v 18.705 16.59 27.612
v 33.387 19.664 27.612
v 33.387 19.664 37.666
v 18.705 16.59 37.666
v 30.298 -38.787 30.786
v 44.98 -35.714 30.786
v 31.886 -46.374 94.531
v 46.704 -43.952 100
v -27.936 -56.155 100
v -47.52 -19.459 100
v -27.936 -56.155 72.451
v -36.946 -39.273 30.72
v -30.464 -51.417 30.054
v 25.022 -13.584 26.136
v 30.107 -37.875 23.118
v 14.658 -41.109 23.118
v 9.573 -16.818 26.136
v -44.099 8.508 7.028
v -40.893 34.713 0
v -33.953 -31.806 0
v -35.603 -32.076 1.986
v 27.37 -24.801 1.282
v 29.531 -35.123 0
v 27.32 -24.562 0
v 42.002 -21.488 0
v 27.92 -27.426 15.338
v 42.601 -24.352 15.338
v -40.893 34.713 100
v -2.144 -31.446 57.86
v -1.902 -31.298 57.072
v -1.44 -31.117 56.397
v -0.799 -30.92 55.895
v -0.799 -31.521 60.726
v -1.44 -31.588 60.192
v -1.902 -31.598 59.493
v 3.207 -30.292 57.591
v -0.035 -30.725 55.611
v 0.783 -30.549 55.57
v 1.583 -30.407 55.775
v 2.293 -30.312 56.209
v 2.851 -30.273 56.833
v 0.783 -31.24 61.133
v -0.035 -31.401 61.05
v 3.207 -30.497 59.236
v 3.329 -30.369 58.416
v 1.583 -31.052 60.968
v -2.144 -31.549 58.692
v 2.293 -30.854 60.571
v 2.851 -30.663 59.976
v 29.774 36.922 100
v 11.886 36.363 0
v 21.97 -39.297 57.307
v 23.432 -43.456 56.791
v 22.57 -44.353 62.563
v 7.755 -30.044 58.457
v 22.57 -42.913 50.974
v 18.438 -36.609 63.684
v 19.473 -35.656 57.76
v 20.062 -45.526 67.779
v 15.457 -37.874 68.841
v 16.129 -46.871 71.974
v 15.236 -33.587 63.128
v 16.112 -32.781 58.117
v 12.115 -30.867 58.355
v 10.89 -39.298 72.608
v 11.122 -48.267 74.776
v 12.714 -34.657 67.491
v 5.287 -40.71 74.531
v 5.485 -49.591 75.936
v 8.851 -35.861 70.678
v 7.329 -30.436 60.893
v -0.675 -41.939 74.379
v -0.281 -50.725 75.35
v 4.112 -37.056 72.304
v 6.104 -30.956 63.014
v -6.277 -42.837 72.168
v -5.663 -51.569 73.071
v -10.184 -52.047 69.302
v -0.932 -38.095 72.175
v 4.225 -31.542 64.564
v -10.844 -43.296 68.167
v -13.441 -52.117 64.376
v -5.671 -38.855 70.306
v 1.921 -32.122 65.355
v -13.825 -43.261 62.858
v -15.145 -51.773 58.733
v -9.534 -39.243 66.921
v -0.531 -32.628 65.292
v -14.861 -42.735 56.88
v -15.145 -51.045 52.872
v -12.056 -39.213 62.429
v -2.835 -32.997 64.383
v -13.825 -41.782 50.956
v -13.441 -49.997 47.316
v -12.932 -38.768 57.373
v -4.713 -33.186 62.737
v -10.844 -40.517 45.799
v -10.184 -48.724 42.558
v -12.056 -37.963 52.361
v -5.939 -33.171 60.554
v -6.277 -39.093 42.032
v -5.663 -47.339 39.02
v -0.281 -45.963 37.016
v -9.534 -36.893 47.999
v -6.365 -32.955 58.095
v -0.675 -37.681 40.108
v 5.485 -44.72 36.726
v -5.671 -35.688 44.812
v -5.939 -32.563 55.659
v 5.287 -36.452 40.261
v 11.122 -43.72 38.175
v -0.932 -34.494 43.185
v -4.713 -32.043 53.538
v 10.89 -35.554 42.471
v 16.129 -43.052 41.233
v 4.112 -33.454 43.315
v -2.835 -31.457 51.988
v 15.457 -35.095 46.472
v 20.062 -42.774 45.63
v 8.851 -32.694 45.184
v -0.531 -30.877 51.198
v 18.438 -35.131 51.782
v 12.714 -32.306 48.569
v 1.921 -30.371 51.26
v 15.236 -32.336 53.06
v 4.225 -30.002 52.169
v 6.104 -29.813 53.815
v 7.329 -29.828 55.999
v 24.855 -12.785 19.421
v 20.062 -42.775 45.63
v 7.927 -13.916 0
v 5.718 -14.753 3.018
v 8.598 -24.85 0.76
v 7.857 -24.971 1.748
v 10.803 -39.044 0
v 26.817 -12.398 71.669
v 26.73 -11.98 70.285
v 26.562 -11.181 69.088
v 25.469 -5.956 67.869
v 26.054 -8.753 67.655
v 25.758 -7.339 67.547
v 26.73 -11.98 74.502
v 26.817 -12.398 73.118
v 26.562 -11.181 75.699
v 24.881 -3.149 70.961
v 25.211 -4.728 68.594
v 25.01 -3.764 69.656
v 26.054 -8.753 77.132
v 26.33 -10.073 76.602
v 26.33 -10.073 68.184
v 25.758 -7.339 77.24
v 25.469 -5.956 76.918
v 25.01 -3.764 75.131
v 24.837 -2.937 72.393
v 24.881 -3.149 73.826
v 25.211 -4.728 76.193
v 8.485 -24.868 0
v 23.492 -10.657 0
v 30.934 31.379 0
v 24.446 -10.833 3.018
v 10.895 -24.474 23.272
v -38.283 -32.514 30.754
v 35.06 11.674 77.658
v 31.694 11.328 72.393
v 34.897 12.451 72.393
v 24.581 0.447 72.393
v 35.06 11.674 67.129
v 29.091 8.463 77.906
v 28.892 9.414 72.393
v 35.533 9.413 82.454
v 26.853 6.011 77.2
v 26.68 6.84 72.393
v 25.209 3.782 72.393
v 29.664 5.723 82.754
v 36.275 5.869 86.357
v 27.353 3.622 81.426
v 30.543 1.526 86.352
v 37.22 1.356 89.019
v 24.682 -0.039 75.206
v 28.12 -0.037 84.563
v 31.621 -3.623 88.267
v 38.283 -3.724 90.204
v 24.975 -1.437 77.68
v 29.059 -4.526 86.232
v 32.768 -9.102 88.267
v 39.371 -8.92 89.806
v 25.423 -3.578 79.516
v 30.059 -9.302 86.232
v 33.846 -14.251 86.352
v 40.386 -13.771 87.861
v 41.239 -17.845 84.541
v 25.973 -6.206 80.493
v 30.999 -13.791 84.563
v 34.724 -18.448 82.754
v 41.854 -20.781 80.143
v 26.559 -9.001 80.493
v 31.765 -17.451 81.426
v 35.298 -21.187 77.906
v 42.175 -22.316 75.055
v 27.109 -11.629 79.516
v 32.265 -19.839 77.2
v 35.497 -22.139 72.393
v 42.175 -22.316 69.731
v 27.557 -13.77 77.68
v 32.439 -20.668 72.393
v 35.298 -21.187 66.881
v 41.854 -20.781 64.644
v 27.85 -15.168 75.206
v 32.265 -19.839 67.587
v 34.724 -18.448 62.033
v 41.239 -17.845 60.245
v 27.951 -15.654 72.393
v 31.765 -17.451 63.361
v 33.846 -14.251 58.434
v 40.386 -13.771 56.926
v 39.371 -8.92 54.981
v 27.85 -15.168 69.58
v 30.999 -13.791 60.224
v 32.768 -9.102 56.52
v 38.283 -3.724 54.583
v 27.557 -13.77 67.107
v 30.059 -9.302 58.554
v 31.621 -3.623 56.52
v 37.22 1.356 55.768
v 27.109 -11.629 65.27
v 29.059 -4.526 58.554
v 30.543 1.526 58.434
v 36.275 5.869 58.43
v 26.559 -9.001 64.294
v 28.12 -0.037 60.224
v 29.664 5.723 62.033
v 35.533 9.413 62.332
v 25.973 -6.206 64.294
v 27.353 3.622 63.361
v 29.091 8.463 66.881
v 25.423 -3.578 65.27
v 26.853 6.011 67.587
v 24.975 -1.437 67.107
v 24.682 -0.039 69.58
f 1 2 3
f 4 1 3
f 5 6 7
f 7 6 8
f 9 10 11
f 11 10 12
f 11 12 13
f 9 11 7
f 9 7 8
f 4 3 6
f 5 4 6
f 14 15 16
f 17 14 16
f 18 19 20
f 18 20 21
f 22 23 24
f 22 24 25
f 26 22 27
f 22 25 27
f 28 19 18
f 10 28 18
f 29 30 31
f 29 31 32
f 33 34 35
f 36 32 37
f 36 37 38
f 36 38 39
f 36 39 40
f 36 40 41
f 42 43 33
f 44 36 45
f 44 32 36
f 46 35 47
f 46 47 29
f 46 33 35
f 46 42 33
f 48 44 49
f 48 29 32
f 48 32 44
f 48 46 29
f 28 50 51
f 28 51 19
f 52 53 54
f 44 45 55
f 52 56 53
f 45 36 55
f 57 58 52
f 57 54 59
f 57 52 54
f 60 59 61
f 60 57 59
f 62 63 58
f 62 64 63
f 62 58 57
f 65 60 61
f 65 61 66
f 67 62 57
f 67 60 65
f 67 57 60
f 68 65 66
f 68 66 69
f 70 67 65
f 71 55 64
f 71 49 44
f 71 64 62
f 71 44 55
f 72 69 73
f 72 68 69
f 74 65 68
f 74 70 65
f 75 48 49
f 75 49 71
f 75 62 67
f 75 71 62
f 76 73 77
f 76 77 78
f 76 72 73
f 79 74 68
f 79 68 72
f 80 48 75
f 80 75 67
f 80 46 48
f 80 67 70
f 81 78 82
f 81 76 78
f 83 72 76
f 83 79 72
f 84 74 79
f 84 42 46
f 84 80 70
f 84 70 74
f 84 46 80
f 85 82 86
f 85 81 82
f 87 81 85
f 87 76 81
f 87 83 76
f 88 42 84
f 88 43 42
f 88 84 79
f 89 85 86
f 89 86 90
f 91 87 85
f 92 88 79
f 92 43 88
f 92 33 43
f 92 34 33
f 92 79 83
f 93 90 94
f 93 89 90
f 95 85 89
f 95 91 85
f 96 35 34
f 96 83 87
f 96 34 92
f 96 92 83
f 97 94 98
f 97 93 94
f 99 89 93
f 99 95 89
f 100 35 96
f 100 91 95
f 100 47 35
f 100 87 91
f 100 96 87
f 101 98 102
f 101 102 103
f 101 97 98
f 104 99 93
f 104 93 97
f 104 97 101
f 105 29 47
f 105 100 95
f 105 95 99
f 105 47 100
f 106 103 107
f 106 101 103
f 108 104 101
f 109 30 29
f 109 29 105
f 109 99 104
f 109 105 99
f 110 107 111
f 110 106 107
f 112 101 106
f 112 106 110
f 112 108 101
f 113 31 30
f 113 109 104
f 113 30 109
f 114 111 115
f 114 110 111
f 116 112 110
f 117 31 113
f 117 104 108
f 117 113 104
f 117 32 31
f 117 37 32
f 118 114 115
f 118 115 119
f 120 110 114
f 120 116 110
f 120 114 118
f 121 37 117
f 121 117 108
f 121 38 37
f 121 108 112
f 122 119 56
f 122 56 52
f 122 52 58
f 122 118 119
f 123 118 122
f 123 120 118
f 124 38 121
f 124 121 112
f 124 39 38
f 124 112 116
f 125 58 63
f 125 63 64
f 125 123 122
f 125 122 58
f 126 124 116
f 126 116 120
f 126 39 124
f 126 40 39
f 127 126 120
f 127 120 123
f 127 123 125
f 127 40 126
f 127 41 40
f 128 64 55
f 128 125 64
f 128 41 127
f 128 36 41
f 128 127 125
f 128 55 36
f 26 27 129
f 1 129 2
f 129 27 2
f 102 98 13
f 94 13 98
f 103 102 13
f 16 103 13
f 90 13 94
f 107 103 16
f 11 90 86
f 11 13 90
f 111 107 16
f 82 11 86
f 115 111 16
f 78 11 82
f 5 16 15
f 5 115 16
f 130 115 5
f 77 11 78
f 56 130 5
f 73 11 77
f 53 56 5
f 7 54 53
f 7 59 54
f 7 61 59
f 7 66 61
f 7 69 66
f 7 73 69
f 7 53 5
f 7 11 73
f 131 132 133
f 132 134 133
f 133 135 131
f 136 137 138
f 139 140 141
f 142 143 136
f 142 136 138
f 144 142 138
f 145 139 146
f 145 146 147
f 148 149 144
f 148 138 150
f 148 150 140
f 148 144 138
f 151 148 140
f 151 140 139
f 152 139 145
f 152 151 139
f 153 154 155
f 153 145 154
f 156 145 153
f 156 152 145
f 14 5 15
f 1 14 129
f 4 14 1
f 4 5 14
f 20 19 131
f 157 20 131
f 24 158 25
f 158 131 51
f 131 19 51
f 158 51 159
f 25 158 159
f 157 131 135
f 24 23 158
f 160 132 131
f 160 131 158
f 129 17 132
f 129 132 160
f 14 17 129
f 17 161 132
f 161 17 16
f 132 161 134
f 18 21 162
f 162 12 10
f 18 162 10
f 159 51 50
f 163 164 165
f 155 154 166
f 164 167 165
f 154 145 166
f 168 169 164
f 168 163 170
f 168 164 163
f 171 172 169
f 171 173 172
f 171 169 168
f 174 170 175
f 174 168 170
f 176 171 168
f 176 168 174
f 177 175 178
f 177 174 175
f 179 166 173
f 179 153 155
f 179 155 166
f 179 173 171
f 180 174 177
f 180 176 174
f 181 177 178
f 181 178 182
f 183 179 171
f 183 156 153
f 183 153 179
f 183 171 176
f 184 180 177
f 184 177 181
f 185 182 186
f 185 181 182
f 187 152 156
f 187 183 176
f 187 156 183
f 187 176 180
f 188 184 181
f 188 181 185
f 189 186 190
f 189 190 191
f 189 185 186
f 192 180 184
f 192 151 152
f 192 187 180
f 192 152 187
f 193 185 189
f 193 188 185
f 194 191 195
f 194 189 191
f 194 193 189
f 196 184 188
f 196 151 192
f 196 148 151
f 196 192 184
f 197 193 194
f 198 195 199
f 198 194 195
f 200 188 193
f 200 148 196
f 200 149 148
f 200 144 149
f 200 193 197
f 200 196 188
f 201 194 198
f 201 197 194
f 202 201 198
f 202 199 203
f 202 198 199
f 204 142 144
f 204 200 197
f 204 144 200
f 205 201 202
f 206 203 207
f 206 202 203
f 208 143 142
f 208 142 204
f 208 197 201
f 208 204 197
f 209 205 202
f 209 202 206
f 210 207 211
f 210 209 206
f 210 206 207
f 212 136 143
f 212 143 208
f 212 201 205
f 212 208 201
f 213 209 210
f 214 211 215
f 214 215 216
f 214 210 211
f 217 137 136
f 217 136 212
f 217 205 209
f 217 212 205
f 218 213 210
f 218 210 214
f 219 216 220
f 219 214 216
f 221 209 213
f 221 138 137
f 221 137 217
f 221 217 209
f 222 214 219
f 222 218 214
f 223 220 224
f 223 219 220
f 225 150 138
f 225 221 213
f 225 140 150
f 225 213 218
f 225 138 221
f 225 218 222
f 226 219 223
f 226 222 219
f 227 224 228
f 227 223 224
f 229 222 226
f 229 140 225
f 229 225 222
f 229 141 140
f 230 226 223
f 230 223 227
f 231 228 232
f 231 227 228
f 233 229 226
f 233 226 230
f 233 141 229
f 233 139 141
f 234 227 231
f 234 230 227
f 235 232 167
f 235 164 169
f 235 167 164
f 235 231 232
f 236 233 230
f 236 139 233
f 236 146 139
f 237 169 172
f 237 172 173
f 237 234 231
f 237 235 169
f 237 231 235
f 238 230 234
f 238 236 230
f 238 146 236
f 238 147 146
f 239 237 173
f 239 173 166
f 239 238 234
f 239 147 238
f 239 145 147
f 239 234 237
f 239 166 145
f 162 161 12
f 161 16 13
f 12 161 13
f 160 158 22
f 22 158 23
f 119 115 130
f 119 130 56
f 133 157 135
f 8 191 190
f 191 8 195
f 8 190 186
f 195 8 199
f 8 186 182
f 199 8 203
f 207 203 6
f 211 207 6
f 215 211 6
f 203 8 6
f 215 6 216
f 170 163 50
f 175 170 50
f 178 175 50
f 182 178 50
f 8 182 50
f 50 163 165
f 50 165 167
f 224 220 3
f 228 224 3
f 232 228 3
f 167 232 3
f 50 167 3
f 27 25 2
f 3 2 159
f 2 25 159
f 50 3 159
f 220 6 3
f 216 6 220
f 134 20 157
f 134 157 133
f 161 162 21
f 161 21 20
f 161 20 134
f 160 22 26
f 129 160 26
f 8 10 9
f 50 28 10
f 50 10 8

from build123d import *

# Parameters (mm, degrees)
F1_DEPTH  = 100
F6_DEPTH  = 25
F7_DEPTH  = 15
F9_DEPTH  = 25
F3_R      = 17.8601151659
F10_DEPTH = 13
F11_R     = 12.99999
F13_DEPTH = 25
F14_DEPTH = 90
F12_R     = 19.8108840593
F15_DEPTH = 17
F16_R     = 16.99999
F18_DEPTH = 25


# Not quite as in the source:
# - a fillet or chamfer is up to 0.001 mm smaller than in the source, because OpenCascade refuses the exact size


with BuildPart() as f1:
    # F0 (on Top) → F1 (new body)
    with BuildSketch(Plane.XY):
        Polygon((-47.5200526416, -19.4592215121), (-27.9358569533, -56.1545789242), (46.7044450343, -43.9518280327), (29.7740362585, 36.9222164154), (-40.8926419914, 34.7126610577), align=None)
    extrude(amount=F1_DEPTH)

    # F5 (on 3pt) → F6 (cut)
    with BuildSketch(Plane(origin=(9.6412332648, 36.848921293, -1.9307798529), x_dir=(0.9675193136, -0.2524507981, 0.0132277119), z_dir=(-0.2527971081, -0.9661938968, 0.0506258432))):
        Polygon((22.0081010682, 1.6419123086), (20.808683311, 101.7949787998), (2.3196212658, 1.9027031079), align=None)
    extrude(amount=-F6_DEPTH, mode=Mode.SUBTRACT)

    # F3 (on face) → F7 (cut)
    with BuildSketch(Plane(origin=(35.9288773181, 7.5214561607, 0), x_dir=(-0.2049012214, 0.9787826569, 0), z_dir=(0.9787826569, 0.2049012214, 0))):
        Polygon((-44.1726371646, 30.7864621282), (-52.589084849, 100), (-52.589084849, 0), (-29.6385996044, 0), (-32.5648710132, 15.3381312266), (12.4055901776, 27.6119541377), (12.4055901776, 37.6664411777), align=None)
    extrude(amount=-F7_DEPTH, mode=Mode.SUBTRACT)

    # F8 (on face) → F9 (cut)
    with BuildSketch(Plane(origin=(8.1632362237, -38.9945652191, -4.8445740248), x_dir=(0.979095124, 0.2018510885, 0.0250774059), z_dir=(0.2034028962, -0.9716253806, -0.1207119775))):
        Polygon((39.3641106636, 104.6558680882), (-79.5409610954, 107.6664552623), (-81.3024698416, 37.9594929491), (22.60753629, 35.3336665102), (24.2297143871, 99.5269938077), align=None)
        Polygon((22.60753629, 35.3336665102), (-81.3024698416, 37.9594929491), (-82.4683913698, -8.1787100022), (37.6027492107, -11.21293151), (37.6027492107, 34.9547345092), align=None)
    extrude(amount=F9_DEPTH, mode=Mode.SUBTRACT)

    # F3 (on face) → F10 (cut)
    with BuildSketch(Plane(origin=(35.9288773181, 7.5214561607, 0), x_dir=(-0.2049012214, 0.9787826569, 0), z_dir=(0.9787826569, 0.2049012214, 0))):
        with Locations((-12.8240771592, 72.3933577538)):
            Circle(F3_R)
    extrude(amount=-F10_DEPTH, mode=Mode.SUBTRACT)

    # F11 (radius 13 in the source; OpenCascade refuses exactly that, so slightly less here)
    f11_edges = [f1.edges().sort_by_distance(p)[0] for p in [
        (29.491931, -25.175415, 72.393358),
    ]]
    fillet(f11_edges, radius=F11_R)

    # F12 (on face) → F13 (cut)
    with BuildSketch(Plane(origin=(8.1632362237, -38.9945652191, -4.8445740248), x_dir=(0.979095124, 0.2018510885, 0.0250774059), z_dir=(0.2034028962, -0.9716253806, -0.1207119775))):
        Polygon((21.8240755779, 4.3303198355), (22.4123828022, 27.6109930646), (6.6332079808, 28.009735938), (2.6960770767, 4.8136881468), align=None)
        Polygon((18.9769355737, -4.4831562801), (21.8240755779, 4.3303198355), (2.6960770767, 4.8136881468), (9.4391942611, -4.4458445128), align=None)
    extrude(amount=-F13_DEPTH, mode=Mode.SUBTRACT)

    # F12 (on face) → F14 (cut)
    with BuildSketch(Plane(origin=(8.1632362237, -38.9945652191, -4.8445740248), x_dir=(0.979095124, 0.2018510885, 0.0250774059), z_dir=(0.2034028962, -0.9716253806, -0.1207119775))):
        Polygon((-50.4545168754, 2.399114297), (-41.2831704405, 5.9250524436), (-47.9467762851, 101.636191148), align=None)
        Polygon((-33.0309979628, -4.2797005717), (-41.2831704405, 5.9250524436), (-50.4545168754, 2.399114297), align=None)
    extrude(amount=-F14_DEPTH, mode=Mode.SUBTRACT)

    # F12 (on face) → F15 (cut)
    with BuildSketch(Plane(origin=(8.1632362237, -38.9945652191, -4.8445740248), x_dir=(0.979095124, 0.2018510885, 0.0250774059), z_dir=(0.2034028962, -0.9716253806, -0.1207119775))):
        with Locations((-4.2161699384, 61.7149807513)):
            Circle(F12_R)
    extrude(amount=-F15_DEPTH, mode=Mode.SUBTRACT)

    # F16 (radius 17 in the source; OpenCascade refuses exactly that, so slightly less here)
    f16_edges = [f1.edges().sort_by_distance(p)[0] for p in [
        (-18.819384, -34.935619, 57.849136),
    ]]
    fillet(f16_edges, radius=F16_R)

    # F17 (on face) → F18 (cut)
    with BuildSketch(Plane(origin=(8.2143401196, -50.2444762342, 0), x_dir=(0.9868979975, 0.1613454139, 0), z_dir=(0.1613454139, -0.9868979975, 0))):
        Polygon((7.8329915962, 23.1178128028), (-44.1760422775, 30.926933164), (-42.148109545, 7.0275762015), (-39.5882407468, 0), (4.361868039, 0), align=None)
    extrude(amount=-F18_DEPTH, mode=Mode.SUBTRACT)


solid = f1.part
